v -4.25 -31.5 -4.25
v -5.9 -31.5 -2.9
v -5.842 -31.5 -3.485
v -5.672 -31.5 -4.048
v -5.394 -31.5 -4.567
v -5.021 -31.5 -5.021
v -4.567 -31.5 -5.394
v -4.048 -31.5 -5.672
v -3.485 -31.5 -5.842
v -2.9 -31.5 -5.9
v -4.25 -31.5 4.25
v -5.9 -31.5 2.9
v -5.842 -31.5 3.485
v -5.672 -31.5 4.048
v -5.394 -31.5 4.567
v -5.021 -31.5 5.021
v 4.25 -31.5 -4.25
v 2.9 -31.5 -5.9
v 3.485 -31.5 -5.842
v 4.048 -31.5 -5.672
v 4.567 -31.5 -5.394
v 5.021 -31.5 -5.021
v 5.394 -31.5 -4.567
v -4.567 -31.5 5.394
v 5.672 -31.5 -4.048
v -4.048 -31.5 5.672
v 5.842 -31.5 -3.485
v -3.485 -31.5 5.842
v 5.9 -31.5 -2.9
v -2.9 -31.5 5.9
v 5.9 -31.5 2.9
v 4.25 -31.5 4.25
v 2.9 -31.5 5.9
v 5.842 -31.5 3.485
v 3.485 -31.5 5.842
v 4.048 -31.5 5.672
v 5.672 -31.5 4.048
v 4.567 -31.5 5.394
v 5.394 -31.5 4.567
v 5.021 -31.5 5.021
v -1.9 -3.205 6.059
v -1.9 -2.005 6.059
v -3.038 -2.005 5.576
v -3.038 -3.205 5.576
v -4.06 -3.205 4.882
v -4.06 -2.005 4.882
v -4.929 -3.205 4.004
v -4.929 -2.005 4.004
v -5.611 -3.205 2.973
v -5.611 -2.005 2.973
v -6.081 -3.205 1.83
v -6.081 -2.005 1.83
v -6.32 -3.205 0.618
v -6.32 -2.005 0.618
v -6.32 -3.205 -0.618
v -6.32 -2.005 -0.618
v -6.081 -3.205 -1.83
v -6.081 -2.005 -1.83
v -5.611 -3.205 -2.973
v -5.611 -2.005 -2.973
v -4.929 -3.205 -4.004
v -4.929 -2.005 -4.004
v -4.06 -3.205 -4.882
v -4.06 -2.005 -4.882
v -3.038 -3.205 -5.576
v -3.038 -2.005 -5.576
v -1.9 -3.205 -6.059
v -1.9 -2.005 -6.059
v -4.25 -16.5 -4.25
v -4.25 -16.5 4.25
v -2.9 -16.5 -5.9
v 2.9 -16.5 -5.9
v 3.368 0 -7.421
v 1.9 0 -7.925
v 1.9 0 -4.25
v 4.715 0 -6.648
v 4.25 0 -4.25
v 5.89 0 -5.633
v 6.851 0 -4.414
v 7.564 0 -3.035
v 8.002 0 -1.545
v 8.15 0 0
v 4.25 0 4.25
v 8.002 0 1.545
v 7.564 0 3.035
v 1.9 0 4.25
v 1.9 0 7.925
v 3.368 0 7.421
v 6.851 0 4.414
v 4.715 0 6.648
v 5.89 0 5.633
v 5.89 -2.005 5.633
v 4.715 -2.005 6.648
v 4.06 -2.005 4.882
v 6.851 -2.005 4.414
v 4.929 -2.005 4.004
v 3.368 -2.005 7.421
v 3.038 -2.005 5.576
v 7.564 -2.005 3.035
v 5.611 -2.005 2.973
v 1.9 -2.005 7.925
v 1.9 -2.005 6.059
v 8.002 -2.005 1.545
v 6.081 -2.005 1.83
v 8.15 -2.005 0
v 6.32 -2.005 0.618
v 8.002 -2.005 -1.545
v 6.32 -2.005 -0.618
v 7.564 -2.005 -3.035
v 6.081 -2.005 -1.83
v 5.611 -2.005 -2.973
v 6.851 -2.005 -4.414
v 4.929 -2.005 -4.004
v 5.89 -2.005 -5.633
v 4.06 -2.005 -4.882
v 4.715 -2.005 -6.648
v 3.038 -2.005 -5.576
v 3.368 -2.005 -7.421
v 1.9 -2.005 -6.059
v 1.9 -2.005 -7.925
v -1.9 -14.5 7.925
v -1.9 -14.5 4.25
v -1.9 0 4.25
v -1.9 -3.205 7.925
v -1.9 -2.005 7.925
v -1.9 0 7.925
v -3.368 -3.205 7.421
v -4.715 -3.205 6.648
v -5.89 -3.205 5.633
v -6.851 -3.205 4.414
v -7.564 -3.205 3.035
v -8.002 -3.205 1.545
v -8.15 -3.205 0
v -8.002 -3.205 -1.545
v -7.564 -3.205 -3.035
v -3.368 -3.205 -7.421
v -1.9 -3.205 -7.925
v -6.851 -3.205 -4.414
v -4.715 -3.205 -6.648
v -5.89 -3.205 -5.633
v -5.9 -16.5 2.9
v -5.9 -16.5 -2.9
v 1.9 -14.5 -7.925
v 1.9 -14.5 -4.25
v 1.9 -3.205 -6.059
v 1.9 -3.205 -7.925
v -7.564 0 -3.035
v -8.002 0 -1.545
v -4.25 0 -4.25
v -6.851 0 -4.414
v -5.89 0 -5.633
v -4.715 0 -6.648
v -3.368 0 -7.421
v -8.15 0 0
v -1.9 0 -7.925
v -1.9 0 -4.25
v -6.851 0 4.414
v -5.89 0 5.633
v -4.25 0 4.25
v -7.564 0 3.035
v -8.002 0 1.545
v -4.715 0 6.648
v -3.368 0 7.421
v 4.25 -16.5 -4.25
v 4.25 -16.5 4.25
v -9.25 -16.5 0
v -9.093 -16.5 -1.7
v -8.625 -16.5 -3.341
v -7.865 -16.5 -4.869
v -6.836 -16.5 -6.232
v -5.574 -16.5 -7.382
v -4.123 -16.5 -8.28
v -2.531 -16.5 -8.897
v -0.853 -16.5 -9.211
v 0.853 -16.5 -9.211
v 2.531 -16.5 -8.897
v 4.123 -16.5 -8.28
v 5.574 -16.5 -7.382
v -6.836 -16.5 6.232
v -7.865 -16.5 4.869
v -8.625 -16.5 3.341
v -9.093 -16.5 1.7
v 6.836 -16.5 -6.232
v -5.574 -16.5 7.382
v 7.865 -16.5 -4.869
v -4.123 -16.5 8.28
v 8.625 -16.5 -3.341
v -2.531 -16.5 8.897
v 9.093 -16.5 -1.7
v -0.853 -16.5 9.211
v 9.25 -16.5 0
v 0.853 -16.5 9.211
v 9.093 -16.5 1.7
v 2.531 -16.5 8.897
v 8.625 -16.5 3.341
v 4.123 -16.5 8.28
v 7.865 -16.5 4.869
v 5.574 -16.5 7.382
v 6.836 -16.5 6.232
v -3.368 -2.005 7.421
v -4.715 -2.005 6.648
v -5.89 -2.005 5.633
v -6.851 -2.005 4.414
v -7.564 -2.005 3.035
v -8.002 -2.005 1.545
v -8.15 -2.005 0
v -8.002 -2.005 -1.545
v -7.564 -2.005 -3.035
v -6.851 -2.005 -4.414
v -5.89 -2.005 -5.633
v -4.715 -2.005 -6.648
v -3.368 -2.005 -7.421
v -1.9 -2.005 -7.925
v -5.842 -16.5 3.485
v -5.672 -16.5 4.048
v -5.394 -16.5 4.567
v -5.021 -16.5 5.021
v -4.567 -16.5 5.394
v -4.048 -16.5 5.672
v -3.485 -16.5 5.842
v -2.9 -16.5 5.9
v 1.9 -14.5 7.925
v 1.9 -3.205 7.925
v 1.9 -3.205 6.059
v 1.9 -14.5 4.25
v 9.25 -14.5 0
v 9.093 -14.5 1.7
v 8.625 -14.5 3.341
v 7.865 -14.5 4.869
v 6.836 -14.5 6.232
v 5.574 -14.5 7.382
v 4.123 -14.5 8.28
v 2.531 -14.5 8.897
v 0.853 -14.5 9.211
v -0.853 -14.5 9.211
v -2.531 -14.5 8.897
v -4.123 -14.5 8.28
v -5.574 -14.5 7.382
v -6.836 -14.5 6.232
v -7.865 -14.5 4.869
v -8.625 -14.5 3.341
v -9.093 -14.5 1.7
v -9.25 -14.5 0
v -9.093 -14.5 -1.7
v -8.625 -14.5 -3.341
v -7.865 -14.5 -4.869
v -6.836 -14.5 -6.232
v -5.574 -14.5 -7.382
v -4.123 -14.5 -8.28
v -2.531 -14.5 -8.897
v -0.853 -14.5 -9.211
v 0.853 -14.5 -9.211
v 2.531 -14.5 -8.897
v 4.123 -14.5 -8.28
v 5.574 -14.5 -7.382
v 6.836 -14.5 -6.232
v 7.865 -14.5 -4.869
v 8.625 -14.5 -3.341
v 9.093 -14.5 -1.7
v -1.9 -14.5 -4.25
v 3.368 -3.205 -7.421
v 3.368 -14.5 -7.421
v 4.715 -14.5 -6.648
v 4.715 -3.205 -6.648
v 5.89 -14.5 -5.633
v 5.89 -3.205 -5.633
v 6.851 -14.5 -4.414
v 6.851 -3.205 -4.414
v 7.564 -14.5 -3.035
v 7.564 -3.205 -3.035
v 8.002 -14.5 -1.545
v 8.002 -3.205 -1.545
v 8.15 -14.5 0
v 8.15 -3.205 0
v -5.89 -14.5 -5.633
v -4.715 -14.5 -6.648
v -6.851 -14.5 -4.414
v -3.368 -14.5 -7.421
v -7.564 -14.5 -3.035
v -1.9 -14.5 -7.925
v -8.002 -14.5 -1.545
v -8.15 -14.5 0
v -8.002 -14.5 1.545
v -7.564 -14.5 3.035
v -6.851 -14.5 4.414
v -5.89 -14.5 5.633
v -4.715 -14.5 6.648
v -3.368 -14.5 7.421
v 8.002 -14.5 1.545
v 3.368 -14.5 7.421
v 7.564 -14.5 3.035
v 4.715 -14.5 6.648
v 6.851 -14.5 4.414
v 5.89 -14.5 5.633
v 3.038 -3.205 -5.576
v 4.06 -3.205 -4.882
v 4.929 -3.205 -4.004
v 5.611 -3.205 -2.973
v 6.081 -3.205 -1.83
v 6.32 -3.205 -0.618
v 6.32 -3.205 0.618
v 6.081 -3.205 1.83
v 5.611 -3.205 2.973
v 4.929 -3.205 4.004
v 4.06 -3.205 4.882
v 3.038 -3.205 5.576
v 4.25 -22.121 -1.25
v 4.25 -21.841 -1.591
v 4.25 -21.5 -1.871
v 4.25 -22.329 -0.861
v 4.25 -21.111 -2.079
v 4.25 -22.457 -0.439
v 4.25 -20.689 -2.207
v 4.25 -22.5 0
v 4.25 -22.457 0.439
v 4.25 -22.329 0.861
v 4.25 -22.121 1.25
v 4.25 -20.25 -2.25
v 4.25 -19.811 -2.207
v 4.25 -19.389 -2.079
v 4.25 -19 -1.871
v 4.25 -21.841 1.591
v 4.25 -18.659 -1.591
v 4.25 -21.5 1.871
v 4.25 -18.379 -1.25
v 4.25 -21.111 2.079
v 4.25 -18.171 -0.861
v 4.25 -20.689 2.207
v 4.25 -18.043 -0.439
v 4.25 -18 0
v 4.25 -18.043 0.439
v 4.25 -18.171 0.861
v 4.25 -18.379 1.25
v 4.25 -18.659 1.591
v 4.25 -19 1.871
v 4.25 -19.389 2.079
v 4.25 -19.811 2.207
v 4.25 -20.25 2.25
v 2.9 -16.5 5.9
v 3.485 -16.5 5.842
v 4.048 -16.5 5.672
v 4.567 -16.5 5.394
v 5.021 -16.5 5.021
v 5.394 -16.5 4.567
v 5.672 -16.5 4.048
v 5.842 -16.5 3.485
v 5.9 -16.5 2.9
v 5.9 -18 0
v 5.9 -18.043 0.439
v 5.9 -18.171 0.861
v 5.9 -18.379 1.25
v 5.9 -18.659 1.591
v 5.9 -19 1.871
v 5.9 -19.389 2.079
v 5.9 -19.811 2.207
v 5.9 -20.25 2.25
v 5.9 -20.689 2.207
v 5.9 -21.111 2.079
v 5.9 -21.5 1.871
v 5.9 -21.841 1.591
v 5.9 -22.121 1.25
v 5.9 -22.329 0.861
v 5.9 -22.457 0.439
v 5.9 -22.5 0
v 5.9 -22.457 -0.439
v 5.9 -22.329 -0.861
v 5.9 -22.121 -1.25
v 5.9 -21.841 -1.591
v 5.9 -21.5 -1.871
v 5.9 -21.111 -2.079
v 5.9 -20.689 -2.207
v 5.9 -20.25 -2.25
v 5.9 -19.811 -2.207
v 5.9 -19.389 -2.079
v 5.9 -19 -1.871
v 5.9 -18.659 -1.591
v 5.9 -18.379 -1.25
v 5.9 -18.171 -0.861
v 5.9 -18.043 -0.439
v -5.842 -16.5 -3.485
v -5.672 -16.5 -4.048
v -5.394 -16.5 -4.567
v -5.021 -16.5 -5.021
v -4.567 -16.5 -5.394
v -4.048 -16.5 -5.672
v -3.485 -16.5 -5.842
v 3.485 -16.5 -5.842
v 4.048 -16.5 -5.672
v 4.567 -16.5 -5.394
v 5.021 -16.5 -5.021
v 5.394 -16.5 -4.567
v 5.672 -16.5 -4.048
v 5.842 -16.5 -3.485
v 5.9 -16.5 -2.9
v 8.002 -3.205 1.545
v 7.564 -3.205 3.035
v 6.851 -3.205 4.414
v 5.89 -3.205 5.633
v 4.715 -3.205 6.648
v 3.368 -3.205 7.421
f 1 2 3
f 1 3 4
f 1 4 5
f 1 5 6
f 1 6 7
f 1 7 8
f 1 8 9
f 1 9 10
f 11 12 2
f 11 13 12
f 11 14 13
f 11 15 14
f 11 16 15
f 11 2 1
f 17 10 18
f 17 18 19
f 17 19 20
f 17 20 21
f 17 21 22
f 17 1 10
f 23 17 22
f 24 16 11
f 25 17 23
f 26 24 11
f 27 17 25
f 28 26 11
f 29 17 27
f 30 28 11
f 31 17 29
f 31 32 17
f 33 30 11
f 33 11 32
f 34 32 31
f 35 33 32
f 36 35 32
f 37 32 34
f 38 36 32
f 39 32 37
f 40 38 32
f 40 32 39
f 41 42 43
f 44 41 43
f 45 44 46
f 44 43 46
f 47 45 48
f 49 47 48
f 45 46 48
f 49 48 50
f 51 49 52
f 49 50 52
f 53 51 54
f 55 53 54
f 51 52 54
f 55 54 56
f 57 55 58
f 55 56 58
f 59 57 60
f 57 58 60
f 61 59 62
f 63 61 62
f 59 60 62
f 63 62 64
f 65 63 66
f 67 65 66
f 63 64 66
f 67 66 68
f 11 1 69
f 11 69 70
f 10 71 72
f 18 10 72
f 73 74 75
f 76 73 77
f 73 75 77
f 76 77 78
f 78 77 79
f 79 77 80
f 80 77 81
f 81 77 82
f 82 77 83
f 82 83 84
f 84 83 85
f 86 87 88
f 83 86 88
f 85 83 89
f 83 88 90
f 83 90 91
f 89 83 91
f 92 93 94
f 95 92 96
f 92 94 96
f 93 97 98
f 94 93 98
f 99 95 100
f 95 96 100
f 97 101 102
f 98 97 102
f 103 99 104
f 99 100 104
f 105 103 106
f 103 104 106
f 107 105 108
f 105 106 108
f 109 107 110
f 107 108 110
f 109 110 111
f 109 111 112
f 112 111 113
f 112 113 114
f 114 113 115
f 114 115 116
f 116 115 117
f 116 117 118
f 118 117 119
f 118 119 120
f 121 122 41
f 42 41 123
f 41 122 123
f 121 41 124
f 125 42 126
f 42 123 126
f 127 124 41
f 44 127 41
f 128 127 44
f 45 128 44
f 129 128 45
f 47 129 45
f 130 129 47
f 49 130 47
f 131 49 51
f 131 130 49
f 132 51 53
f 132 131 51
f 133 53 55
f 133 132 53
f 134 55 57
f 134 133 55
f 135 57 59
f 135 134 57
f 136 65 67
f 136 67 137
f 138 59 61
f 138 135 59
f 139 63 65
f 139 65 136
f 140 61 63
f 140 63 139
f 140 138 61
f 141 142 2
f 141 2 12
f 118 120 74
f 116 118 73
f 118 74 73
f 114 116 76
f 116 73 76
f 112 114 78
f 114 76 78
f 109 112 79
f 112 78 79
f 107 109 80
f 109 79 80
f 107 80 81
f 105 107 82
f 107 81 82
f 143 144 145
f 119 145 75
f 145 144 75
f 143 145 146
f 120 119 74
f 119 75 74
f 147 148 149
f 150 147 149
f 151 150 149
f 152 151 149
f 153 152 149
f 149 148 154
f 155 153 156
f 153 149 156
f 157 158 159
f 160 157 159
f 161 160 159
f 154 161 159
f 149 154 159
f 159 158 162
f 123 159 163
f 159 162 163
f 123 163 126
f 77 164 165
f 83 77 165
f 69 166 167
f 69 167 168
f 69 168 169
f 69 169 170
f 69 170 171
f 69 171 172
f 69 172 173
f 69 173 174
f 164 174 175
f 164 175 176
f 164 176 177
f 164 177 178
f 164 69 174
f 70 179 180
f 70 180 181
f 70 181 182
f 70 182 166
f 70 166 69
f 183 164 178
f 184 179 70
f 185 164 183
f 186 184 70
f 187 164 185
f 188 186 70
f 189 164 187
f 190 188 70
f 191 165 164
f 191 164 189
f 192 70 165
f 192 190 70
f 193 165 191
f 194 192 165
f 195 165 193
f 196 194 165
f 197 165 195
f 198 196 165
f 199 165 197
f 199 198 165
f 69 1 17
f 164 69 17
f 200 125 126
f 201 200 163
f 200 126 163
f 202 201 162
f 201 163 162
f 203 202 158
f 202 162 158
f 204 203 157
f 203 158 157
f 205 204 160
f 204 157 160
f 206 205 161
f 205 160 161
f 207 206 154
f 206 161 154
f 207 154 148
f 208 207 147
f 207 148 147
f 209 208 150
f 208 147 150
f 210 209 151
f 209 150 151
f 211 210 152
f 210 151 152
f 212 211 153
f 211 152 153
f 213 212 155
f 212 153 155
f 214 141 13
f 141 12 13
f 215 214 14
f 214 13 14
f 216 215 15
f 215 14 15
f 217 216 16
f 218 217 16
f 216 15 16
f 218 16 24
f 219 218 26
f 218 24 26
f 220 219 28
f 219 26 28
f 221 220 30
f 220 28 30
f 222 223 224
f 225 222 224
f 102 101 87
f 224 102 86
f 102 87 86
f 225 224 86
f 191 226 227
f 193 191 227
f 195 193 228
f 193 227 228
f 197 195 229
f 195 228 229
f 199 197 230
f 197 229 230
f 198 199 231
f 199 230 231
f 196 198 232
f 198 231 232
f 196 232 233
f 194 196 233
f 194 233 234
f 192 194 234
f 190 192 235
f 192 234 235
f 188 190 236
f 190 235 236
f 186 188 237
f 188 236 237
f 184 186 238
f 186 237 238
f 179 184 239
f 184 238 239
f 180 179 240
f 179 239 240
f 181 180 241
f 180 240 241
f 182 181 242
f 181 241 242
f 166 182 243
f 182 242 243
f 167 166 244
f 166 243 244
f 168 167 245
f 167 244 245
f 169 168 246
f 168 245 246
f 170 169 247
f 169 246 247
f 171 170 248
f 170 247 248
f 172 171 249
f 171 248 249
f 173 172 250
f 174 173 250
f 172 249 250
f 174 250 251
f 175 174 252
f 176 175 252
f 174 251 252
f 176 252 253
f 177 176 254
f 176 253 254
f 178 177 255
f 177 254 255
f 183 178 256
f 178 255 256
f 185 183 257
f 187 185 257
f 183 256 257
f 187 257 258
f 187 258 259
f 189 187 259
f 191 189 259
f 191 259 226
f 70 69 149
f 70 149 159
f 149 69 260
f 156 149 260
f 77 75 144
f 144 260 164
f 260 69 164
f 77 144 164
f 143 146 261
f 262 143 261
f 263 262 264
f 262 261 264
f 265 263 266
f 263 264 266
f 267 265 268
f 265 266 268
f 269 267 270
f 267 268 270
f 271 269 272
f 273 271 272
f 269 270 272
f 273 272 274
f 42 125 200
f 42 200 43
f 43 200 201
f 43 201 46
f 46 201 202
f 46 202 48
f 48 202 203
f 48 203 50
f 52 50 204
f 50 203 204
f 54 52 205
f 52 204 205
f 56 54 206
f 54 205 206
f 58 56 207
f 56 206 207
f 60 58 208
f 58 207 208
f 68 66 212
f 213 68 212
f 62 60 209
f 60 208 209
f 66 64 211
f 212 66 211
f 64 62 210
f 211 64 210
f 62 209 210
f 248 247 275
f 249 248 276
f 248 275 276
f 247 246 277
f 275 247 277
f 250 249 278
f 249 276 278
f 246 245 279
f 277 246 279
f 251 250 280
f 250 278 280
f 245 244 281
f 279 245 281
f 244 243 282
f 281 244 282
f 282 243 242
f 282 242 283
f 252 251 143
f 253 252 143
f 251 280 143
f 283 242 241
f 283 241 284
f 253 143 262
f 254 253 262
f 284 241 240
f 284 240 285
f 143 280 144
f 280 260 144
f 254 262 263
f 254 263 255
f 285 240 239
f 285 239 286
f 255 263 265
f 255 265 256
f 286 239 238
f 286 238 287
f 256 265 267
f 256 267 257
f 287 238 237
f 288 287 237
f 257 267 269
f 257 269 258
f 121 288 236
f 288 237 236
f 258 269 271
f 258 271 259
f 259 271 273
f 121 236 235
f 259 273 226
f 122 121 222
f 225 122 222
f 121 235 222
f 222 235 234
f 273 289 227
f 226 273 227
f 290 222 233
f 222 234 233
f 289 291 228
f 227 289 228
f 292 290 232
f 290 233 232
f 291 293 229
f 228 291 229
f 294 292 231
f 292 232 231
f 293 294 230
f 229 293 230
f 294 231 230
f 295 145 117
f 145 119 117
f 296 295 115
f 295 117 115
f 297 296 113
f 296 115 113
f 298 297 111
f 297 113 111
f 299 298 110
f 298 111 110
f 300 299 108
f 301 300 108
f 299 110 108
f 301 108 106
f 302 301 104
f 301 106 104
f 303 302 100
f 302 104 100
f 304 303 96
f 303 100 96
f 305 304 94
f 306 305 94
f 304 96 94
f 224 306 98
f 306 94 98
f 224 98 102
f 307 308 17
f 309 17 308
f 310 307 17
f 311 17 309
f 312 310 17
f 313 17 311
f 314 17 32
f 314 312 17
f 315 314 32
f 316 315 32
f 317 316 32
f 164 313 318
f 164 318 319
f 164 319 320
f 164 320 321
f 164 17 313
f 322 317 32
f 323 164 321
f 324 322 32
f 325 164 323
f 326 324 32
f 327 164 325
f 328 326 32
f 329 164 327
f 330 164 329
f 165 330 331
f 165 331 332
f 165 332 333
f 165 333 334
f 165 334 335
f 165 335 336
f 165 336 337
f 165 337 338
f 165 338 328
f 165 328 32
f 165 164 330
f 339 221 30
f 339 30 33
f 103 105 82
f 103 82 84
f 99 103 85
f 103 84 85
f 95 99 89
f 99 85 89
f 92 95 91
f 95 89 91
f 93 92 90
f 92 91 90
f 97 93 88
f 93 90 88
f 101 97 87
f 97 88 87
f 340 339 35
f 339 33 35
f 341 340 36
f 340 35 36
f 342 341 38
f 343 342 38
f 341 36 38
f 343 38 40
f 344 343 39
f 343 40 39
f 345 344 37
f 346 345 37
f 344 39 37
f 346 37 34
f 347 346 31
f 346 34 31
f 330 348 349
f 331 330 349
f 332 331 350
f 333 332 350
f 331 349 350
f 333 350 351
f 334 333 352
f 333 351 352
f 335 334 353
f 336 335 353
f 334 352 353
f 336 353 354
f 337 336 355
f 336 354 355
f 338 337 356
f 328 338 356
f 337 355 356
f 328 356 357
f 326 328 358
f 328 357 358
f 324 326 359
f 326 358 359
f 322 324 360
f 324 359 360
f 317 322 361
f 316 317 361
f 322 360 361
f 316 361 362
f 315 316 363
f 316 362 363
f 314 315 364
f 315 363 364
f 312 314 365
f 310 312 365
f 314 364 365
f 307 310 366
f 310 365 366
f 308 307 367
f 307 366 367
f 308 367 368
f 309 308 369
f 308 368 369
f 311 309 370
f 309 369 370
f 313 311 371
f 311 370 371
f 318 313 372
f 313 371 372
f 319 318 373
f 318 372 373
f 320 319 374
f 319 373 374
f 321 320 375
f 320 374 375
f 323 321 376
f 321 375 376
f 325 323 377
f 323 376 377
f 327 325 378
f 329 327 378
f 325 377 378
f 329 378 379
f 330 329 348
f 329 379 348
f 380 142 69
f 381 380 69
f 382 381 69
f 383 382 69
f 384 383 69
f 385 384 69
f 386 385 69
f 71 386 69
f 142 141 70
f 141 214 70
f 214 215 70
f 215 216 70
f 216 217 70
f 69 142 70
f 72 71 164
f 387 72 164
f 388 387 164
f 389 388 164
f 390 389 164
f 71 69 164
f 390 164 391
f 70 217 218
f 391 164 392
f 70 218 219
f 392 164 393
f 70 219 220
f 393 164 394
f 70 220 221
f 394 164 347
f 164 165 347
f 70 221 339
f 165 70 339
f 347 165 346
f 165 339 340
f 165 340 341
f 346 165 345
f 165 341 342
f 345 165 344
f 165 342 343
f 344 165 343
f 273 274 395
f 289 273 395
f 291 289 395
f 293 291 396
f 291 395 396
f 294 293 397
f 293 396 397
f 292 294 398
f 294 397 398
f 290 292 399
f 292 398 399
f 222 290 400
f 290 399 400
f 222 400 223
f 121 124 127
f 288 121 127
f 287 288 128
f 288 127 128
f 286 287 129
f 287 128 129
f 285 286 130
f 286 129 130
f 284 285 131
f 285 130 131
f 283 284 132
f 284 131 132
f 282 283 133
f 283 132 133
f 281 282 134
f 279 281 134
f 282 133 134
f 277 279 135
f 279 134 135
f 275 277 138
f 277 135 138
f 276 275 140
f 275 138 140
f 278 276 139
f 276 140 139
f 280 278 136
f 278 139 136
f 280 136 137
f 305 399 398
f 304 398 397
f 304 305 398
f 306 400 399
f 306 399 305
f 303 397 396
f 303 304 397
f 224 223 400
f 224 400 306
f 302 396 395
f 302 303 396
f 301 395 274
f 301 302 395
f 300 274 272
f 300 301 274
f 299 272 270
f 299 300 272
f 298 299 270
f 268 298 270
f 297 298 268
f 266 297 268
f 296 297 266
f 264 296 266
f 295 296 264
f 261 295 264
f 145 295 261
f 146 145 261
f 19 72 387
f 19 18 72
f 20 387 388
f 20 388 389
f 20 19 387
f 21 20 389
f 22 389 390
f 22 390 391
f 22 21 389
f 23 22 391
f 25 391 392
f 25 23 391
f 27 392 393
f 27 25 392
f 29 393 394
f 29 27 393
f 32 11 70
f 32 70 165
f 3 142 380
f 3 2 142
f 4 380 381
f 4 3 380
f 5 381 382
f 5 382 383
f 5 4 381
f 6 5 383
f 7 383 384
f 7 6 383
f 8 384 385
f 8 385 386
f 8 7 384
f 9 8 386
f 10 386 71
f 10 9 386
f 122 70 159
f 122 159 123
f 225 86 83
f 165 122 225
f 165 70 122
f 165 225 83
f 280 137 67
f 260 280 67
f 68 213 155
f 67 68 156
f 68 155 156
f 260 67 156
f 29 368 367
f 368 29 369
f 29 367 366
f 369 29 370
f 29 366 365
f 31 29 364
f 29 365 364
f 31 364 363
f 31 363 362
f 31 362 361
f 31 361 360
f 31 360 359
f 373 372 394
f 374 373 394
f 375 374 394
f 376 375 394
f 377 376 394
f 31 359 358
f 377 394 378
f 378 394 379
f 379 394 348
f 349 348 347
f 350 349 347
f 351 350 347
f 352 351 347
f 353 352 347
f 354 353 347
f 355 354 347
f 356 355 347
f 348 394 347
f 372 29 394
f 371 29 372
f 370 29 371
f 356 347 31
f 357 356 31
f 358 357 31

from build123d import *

# Parameters (mm, degrees)
F1_DEPTH  = 14.5
F2_W      = 1.200076
F2_H      = 1.8
F4_R      = 9.25
F5_DEPTH  = 2
F6_W      = 11.8
F6_H      = 11.8
F6_W_2    = 8.5
F6_H_2    = 8.5
F7_DEPTH  = 15
F8_R      = 2.25
F9_DEPTH  = 1.65
F10_R     = 3
F11_DEPTH = 16.501


with BuildPart() as f1:
    # F0 (on Front) → F1 (new body)
    with BuildSketch(Plane.XZ):
        with BuildLine():
            ThreePointArc((1.9, -7.925434), (6.399512, -5.046657), (8.15, 0))
            ThreePointArc((8.15, 0), (6.399512, 5.046657), (1.9, 7.925434))
            Line((1.9, 7.925434), (1.9, 4.25))
            Line((1.9, 4.25), (4.25, 4.25))
            Line((4.25, 4.25), (4.25, -4.25))
            Line((4.25, -4.25), (1.9, -4.25))
            Line((1.9, -4.25), (1.9, -7.925434))
        make_face()
        with BuildLine():
            Line((-1.9, 4.25), (-1.9, 7.925434))
            ThreePointArc((-1.9, 7.925434), (-8.15, 0), (-1.9, -7.925434))
            Line((-1.9, -7.925434), (-1.9, -4.25))
            Line((-1.9, -4.25), (-4.25, -4.25))
            Line((-4.25, -4.25), (-4.25, 4.25))
            Line((-4.25, 4.25), (-1.9, 4.25))
        make_face()
    extrude(amount=F1_DEPTH)

    # F2 (on Right) → F3 (revolve, cut)
    with BuildSketch(Plane.YZ):
        with Locations((-2.604687, 7.25)):
            Rectangle(F2_W, F2_H)
    revolve(axis=Axis((0, -1, 0), (0, -1, 0)), mode=Mode.SUBTRACT)

    # F4 (on face) → F5 (join)
    with BuildSketch(Plane.XZ.offset(14.5)):
        Circle(F4_R)
    extrude(amount=F5_DEPTH)

    # F6 (on face) → F11 (cut, through all)
    with BuildSketch(Plane.XZ.offset(16.5)):
        Rectangle(F6_W_2, F6_H_2)
    extrude(amount=-F11_DEPTH, mode=Mode.SUBTRACT)


with BuildPart() as f7:
    # F6 (on face) → F7 (new body)
    with BuildSketch(Plane.XZ.offset(16.5)):
        Rectangle(F6_W, F6_H)
        Rectangle(F6_W_2, F6_H_2, mode=Mode.SUBTRACT)
    extrude(amount=F7_DEPTH)

    # F8 (on face) → F9 (cut, through all)
    with BuildSketch(Plane.YZ.offset(5.9)):
        with Locations((-20.25, 0)):
            Circle(F8_R)
    extrude(amount=-F9_DEPTH, mode=Mode.SUBTRACT)

    # F10
    f10_edges = [f7.edges().sort_by_distance(p)[0] for p in [
        (-5.9, -24, 5.9),
        (-5.9, -24, -5.9),
        (5.9, -24, 5.9),
        (5.9, -24, -5.9),
    ]]
    fillet(f10_edges, radius=F10_R)


solid = Compound([f1.part, f7.part])
